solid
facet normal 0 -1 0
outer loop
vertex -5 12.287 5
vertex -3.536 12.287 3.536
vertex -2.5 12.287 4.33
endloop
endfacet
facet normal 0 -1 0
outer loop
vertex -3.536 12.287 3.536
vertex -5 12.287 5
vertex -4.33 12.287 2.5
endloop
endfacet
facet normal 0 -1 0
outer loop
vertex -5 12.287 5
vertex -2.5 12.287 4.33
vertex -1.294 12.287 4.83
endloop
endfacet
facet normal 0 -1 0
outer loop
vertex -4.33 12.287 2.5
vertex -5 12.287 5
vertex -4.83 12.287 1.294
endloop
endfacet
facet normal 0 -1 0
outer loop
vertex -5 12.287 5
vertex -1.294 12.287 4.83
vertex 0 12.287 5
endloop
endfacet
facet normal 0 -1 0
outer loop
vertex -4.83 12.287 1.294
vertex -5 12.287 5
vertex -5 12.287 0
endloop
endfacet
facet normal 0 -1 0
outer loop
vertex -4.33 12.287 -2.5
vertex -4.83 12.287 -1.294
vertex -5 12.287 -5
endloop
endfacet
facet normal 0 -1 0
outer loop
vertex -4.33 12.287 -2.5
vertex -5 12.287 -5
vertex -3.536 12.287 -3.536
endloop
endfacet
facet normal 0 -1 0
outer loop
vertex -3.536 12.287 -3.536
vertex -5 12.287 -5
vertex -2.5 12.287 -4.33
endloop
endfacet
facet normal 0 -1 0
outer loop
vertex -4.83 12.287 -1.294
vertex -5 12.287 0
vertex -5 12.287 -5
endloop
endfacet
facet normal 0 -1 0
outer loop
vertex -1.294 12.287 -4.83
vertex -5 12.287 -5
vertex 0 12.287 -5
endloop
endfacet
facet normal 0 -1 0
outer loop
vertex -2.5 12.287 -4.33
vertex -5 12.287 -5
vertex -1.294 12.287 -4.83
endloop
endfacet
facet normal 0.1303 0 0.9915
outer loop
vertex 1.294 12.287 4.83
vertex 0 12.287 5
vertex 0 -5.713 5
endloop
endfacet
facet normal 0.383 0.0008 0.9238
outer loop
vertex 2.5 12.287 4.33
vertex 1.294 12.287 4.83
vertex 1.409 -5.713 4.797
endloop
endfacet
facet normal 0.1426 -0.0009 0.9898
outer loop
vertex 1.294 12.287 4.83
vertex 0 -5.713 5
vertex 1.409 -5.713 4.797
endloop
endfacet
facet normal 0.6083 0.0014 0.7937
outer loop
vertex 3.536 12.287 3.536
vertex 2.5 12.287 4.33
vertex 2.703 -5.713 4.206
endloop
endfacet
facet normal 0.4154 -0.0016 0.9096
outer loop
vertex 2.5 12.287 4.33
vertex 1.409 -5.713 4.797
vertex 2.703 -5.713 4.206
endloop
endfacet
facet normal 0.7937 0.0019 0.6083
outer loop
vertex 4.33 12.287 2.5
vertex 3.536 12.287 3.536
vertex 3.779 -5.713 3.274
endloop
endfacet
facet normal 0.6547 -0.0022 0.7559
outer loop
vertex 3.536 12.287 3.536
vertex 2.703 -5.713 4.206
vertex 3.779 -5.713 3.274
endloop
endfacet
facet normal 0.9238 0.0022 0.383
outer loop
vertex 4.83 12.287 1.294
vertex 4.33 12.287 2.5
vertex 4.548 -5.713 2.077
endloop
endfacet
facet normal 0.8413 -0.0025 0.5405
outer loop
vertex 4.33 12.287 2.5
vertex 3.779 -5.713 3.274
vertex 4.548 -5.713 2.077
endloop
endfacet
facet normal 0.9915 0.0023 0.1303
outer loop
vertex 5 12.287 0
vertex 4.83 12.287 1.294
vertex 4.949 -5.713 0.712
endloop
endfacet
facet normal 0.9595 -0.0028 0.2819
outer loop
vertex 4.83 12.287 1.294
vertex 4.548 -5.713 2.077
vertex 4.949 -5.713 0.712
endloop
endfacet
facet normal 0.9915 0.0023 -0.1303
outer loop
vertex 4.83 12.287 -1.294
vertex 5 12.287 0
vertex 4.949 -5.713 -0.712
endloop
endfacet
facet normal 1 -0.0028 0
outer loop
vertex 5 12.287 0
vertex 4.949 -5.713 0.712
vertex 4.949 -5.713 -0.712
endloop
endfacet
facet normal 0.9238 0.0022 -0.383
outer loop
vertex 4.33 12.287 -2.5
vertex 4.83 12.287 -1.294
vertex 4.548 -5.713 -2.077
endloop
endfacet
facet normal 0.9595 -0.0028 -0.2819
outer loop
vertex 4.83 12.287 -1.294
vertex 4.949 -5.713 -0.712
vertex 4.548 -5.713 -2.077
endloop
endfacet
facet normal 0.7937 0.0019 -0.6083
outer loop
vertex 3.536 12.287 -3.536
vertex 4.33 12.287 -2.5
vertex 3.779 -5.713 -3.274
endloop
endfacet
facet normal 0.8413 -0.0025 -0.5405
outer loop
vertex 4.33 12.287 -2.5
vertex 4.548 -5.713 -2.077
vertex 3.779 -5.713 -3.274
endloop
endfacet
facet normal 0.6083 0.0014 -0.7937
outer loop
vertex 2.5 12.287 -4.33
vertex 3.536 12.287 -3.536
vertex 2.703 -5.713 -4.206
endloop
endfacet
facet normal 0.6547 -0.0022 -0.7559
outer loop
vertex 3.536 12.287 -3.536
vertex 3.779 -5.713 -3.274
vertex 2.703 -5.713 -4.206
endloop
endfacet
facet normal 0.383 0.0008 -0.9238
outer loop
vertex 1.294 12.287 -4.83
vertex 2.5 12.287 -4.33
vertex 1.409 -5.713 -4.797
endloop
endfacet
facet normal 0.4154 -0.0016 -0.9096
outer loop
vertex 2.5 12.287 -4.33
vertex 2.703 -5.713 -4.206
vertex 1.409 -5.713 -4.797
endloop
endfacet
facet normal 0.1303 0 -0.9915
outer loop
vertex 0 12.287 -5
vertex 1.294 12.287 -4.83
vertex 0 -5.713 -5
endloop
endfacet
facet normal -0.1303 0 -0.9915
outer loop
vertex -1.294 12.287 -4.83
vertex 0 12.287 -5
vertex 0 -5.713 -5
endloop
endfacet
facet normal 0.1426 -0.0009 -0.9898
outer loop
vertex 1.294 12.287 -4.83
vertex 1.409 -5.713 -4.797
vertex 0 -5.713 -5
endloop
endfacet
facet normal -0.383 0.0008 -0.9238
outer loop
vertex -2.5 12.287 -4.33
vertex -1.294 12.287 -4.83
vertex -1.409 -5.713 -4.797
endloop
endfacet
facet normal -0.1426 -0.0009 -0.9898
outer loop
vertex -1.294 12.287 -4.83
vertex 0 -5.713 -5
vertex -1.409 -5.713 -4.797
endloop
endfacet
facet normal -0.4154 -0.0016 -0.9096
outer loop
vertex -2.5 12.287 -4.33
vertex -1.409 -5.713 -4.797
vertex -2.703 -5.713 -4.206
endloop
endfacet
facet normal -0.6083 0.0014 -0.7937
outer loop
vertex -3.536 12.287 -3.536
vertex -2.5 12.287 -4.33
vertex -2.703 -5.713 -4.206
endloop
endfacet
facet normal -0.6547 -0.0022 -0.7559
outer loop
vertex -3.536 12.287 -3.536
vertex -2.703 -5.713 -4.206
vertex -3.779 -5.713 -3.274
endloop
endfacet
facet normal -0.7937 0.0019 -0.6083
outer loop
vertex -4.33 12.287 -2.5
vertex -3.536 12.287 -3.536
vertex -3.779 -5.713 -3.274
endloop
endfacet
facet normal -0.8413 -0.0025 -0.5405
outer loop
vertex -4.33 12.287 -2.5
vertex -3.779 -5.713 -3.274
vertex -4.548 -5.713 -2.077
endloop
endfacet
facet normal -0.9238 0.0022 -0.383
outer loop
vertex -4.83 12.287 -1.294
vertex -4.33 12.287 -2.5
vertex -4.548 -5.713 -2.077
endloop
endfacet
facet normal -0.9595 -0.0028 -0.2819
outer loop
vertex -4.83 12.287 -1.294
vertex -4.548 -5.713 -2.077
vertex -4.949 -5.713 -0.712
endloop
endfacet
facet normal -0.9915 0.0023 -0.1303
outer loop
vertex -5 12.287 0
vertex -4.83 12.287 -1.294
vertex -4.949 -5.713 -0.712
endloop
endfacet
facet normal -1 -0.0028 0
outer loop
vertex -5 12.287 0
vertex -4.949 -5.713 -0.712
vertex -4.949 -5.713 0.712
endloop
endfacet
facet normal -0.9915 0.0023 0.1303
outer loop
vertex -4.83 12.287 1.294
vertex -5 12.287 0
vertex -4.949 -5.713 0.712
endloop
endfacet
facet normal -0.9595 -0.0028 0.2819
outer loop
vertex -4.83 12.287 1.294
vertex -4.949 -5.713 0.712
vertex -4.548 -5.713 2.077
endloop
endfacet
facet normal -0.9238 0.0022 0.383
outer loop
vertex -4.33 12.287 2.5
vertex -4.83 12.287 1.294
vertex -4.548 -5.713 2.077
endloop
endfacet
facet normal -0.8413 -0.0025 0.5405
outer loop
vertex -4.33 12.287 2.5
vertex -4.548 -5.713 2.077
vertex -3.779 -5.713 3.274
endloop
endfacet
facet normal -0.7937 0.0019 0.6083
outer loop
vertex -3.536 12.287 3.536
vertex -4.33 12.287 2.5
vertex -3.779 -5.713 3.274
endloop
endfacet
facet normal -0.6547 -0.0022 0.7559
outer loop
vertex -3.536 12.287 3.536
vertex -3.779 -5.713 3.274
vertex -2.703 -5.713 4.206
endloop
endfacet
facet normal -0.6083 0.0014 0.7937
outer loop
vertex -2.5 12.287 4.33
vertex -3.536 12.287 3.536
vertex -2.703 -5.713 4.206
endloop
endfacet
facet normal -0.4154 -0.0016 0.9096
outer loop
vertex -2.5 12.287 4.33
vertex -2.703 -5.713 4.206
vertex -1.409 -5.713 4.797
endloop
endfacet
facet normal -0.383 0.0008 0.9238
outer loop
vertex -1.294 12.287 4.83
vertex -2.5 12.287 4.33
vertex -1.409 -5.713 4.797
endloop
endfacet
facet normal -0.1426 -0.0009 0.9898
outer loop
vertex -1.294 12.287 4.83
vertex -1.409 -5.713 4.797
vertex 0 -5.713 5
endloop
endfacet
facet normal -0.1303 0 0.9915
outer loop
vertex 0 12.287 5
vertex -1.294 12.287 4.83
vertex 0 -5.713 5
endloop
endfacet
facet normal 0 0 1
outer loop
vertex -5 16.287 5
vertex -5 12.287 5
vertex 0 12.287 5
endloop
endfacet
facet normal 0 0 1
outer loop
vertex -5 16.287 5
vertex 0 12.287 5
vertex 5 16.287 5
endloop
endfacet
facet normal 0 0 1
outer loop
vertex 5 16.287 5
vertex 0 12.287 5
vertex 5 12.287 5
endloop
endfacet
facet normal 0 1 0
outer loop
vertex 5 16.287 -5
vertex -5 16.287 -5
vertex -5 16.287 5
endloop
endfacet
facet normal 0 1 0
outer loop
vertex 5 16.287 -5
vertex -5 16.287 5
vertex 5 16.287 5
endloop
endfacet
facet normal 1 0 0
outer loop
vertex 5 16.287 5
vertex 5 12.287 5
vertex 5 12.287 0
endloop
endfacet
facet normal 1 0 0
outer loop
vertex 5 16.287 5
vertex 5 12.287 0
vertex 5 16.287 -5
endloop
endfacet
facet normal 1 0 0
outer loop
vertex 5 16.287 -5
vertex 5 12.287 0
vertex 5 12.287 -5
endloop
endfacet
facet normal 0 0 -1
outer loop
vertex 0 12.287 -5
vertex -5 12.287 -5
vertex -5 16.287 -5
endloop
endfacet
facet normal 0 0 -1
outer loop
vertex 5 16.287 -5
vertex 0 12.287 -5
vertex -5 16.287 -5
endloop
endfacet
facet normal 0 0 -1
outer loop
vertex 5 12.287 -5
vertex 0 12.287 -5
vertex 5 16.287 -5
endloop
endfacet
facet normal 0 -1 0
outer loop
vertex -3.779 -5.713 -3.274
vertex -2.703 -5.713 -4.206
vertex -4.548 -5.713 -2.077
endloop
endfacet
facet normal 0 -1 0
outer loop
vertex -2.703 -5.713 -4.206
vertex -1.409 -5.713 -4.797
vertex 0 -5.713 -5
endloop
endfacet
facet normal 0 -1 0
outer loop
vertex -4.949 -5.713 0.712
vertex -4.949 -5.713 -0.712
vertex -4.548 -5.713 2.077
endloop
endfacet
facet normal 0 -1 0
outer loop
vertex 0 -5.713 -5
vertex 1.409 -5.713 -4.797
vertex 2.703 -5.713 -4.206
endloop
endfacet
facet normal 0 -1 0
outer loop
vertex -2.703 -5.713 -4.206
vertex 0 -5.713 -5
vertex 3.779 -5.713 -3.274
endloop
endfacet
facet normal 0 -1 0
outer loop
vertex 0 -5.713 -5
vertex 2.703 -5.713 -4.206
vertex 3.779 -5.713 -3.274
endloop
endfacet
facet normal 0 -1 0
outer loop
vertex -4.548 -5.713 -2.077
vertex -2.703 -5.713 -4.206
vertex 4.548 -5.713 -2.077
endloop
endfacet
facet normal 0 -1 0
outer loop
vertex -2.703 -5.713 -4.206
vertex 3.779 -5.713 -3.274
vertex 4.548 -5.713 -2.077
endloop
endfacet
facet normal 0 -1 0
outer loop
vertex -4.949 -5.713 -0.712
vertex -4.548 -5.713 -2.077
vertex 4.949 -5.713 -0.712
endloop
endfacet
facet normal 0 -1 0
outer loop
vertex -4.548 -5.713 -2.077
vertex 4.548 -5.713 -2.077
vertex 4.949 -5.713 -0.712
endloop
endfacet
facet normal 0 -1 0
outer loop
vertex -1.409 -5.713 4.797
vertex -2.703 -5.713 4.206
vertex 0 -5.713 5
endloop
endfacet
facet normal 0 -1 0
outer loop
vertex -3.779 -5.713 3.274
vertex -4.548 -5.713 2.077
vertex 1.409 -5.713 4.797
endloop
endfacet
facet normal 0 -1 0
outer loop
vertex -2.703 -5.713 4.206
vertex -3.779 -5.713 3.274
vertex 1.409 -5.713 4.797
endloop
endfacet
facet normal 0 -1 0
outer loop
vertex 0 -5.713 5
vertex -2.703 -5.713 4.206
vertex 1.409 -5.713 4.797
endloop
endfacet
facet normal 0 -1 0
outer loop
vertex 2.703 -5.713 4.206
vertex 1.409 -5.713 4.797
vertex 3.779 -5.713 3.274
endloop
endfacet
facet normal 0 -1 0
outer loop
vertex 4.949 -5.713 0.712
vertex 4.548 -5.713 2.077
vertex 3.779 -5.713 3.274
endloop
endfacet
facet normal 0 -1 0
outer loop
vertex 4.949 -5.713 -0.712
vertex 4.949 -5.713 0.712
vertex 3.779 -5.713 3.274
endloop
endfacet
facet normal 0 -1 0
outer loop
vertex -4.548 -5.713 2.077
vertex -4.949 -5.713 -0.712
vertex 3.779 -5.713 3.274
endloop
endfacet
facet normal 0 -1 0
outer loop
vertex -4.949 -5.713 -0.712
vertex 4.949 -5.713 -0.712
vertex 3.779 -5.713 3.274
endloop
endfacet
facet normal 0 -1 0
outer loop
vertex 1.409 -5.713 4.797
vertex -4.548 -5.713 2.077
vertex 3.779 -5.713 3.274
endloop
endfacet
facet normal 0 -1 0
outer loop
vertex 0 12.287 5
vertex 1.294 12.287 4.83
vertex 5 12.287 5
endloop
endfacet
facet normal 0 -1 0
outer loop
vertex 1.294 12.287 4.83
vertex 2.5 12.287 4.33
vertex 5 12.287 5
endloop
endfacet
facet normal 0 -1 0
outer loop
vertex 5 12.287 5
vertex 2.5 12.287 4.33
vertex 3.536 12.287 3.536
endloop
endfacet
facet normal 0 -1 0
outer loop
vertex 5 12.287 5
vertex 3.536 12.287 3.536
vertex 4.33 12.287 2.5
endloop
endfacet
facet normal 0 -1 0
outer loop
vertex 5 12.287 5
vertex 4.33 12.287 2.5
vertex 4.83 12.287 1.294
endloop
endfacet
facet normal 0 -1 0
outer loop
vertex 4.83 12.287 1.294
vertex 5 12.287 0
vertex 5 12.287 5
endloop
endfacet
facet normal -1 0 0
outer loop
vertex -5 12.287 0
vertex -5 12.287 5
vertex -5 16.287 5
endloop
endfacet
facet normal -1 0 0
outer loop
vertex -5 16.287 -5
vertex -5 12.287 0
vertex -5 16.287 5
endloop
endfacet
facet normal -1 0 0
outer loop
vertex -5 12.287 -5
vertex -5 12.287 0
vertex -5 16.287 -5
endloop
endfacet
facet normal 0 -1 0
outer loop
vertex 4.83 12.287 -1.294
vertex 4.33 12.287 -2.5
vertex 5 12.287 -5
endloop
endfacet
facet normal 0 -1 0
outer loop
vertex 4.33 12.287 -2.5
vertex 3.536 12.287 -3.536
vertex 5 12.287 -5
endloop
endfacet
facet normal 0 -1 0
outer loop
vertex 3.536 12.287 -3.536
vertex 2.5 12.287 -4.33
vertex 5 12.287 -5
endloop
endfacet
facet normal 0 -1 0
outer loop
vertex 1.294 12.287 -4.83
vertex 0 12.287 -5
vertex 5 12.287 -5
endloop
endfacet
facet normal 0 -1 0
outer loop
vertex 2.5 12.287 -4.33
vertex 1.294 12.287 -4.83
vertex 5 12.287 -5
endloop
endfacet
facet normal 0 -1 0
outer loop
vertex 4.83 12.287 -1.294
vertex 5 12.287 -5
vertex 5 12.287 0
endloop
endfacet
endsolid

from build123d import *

# Parameters (mm, degrees)
SKETCH1_R           = 2.5
BOSS_EXTRUDE1_DEPTH = 9
SKETCH2_W           = 5
SKETCH2_H           = 5
BOSS_EXTRUDE2_DEPTH = 2
SCALE1_SCALE        = 2


with BuildPart() as part:
    # Sketch1 → Boss-Extrude1 (new body)
    with BuildSketch(Plane(origin=(0, 0, 0), x_dir=(1, 0, 0), z_dir=(0, 1, 0))):
        with Locations(Location((0, 0, 0), (0, 0, 270))):
            Circle(SKETCH1_R)
    extrude(amount=BOSS_EXTRUDE1_DEPTH)

    # Sketch2 → Boss-Extrude2 (add)
    with BuildSketch(Plane(origin=(0, 9, 0), x_dir=(1, 0, 0), z_dir=(0, 1, 0))):
        Rectangle(SKETCH2_W, SKETCH2_H)
    extrude(amount=BOSS_EXTRUDE2_DEPTH)


with BuildPart() as part_1:
    # Scale1: scaled about (0, 5.712978856, 0)
    add(part.part.scale(SCALE1_SCALE).moved(Location((0, -5.712978856, 0))))


solid = part_1.part
